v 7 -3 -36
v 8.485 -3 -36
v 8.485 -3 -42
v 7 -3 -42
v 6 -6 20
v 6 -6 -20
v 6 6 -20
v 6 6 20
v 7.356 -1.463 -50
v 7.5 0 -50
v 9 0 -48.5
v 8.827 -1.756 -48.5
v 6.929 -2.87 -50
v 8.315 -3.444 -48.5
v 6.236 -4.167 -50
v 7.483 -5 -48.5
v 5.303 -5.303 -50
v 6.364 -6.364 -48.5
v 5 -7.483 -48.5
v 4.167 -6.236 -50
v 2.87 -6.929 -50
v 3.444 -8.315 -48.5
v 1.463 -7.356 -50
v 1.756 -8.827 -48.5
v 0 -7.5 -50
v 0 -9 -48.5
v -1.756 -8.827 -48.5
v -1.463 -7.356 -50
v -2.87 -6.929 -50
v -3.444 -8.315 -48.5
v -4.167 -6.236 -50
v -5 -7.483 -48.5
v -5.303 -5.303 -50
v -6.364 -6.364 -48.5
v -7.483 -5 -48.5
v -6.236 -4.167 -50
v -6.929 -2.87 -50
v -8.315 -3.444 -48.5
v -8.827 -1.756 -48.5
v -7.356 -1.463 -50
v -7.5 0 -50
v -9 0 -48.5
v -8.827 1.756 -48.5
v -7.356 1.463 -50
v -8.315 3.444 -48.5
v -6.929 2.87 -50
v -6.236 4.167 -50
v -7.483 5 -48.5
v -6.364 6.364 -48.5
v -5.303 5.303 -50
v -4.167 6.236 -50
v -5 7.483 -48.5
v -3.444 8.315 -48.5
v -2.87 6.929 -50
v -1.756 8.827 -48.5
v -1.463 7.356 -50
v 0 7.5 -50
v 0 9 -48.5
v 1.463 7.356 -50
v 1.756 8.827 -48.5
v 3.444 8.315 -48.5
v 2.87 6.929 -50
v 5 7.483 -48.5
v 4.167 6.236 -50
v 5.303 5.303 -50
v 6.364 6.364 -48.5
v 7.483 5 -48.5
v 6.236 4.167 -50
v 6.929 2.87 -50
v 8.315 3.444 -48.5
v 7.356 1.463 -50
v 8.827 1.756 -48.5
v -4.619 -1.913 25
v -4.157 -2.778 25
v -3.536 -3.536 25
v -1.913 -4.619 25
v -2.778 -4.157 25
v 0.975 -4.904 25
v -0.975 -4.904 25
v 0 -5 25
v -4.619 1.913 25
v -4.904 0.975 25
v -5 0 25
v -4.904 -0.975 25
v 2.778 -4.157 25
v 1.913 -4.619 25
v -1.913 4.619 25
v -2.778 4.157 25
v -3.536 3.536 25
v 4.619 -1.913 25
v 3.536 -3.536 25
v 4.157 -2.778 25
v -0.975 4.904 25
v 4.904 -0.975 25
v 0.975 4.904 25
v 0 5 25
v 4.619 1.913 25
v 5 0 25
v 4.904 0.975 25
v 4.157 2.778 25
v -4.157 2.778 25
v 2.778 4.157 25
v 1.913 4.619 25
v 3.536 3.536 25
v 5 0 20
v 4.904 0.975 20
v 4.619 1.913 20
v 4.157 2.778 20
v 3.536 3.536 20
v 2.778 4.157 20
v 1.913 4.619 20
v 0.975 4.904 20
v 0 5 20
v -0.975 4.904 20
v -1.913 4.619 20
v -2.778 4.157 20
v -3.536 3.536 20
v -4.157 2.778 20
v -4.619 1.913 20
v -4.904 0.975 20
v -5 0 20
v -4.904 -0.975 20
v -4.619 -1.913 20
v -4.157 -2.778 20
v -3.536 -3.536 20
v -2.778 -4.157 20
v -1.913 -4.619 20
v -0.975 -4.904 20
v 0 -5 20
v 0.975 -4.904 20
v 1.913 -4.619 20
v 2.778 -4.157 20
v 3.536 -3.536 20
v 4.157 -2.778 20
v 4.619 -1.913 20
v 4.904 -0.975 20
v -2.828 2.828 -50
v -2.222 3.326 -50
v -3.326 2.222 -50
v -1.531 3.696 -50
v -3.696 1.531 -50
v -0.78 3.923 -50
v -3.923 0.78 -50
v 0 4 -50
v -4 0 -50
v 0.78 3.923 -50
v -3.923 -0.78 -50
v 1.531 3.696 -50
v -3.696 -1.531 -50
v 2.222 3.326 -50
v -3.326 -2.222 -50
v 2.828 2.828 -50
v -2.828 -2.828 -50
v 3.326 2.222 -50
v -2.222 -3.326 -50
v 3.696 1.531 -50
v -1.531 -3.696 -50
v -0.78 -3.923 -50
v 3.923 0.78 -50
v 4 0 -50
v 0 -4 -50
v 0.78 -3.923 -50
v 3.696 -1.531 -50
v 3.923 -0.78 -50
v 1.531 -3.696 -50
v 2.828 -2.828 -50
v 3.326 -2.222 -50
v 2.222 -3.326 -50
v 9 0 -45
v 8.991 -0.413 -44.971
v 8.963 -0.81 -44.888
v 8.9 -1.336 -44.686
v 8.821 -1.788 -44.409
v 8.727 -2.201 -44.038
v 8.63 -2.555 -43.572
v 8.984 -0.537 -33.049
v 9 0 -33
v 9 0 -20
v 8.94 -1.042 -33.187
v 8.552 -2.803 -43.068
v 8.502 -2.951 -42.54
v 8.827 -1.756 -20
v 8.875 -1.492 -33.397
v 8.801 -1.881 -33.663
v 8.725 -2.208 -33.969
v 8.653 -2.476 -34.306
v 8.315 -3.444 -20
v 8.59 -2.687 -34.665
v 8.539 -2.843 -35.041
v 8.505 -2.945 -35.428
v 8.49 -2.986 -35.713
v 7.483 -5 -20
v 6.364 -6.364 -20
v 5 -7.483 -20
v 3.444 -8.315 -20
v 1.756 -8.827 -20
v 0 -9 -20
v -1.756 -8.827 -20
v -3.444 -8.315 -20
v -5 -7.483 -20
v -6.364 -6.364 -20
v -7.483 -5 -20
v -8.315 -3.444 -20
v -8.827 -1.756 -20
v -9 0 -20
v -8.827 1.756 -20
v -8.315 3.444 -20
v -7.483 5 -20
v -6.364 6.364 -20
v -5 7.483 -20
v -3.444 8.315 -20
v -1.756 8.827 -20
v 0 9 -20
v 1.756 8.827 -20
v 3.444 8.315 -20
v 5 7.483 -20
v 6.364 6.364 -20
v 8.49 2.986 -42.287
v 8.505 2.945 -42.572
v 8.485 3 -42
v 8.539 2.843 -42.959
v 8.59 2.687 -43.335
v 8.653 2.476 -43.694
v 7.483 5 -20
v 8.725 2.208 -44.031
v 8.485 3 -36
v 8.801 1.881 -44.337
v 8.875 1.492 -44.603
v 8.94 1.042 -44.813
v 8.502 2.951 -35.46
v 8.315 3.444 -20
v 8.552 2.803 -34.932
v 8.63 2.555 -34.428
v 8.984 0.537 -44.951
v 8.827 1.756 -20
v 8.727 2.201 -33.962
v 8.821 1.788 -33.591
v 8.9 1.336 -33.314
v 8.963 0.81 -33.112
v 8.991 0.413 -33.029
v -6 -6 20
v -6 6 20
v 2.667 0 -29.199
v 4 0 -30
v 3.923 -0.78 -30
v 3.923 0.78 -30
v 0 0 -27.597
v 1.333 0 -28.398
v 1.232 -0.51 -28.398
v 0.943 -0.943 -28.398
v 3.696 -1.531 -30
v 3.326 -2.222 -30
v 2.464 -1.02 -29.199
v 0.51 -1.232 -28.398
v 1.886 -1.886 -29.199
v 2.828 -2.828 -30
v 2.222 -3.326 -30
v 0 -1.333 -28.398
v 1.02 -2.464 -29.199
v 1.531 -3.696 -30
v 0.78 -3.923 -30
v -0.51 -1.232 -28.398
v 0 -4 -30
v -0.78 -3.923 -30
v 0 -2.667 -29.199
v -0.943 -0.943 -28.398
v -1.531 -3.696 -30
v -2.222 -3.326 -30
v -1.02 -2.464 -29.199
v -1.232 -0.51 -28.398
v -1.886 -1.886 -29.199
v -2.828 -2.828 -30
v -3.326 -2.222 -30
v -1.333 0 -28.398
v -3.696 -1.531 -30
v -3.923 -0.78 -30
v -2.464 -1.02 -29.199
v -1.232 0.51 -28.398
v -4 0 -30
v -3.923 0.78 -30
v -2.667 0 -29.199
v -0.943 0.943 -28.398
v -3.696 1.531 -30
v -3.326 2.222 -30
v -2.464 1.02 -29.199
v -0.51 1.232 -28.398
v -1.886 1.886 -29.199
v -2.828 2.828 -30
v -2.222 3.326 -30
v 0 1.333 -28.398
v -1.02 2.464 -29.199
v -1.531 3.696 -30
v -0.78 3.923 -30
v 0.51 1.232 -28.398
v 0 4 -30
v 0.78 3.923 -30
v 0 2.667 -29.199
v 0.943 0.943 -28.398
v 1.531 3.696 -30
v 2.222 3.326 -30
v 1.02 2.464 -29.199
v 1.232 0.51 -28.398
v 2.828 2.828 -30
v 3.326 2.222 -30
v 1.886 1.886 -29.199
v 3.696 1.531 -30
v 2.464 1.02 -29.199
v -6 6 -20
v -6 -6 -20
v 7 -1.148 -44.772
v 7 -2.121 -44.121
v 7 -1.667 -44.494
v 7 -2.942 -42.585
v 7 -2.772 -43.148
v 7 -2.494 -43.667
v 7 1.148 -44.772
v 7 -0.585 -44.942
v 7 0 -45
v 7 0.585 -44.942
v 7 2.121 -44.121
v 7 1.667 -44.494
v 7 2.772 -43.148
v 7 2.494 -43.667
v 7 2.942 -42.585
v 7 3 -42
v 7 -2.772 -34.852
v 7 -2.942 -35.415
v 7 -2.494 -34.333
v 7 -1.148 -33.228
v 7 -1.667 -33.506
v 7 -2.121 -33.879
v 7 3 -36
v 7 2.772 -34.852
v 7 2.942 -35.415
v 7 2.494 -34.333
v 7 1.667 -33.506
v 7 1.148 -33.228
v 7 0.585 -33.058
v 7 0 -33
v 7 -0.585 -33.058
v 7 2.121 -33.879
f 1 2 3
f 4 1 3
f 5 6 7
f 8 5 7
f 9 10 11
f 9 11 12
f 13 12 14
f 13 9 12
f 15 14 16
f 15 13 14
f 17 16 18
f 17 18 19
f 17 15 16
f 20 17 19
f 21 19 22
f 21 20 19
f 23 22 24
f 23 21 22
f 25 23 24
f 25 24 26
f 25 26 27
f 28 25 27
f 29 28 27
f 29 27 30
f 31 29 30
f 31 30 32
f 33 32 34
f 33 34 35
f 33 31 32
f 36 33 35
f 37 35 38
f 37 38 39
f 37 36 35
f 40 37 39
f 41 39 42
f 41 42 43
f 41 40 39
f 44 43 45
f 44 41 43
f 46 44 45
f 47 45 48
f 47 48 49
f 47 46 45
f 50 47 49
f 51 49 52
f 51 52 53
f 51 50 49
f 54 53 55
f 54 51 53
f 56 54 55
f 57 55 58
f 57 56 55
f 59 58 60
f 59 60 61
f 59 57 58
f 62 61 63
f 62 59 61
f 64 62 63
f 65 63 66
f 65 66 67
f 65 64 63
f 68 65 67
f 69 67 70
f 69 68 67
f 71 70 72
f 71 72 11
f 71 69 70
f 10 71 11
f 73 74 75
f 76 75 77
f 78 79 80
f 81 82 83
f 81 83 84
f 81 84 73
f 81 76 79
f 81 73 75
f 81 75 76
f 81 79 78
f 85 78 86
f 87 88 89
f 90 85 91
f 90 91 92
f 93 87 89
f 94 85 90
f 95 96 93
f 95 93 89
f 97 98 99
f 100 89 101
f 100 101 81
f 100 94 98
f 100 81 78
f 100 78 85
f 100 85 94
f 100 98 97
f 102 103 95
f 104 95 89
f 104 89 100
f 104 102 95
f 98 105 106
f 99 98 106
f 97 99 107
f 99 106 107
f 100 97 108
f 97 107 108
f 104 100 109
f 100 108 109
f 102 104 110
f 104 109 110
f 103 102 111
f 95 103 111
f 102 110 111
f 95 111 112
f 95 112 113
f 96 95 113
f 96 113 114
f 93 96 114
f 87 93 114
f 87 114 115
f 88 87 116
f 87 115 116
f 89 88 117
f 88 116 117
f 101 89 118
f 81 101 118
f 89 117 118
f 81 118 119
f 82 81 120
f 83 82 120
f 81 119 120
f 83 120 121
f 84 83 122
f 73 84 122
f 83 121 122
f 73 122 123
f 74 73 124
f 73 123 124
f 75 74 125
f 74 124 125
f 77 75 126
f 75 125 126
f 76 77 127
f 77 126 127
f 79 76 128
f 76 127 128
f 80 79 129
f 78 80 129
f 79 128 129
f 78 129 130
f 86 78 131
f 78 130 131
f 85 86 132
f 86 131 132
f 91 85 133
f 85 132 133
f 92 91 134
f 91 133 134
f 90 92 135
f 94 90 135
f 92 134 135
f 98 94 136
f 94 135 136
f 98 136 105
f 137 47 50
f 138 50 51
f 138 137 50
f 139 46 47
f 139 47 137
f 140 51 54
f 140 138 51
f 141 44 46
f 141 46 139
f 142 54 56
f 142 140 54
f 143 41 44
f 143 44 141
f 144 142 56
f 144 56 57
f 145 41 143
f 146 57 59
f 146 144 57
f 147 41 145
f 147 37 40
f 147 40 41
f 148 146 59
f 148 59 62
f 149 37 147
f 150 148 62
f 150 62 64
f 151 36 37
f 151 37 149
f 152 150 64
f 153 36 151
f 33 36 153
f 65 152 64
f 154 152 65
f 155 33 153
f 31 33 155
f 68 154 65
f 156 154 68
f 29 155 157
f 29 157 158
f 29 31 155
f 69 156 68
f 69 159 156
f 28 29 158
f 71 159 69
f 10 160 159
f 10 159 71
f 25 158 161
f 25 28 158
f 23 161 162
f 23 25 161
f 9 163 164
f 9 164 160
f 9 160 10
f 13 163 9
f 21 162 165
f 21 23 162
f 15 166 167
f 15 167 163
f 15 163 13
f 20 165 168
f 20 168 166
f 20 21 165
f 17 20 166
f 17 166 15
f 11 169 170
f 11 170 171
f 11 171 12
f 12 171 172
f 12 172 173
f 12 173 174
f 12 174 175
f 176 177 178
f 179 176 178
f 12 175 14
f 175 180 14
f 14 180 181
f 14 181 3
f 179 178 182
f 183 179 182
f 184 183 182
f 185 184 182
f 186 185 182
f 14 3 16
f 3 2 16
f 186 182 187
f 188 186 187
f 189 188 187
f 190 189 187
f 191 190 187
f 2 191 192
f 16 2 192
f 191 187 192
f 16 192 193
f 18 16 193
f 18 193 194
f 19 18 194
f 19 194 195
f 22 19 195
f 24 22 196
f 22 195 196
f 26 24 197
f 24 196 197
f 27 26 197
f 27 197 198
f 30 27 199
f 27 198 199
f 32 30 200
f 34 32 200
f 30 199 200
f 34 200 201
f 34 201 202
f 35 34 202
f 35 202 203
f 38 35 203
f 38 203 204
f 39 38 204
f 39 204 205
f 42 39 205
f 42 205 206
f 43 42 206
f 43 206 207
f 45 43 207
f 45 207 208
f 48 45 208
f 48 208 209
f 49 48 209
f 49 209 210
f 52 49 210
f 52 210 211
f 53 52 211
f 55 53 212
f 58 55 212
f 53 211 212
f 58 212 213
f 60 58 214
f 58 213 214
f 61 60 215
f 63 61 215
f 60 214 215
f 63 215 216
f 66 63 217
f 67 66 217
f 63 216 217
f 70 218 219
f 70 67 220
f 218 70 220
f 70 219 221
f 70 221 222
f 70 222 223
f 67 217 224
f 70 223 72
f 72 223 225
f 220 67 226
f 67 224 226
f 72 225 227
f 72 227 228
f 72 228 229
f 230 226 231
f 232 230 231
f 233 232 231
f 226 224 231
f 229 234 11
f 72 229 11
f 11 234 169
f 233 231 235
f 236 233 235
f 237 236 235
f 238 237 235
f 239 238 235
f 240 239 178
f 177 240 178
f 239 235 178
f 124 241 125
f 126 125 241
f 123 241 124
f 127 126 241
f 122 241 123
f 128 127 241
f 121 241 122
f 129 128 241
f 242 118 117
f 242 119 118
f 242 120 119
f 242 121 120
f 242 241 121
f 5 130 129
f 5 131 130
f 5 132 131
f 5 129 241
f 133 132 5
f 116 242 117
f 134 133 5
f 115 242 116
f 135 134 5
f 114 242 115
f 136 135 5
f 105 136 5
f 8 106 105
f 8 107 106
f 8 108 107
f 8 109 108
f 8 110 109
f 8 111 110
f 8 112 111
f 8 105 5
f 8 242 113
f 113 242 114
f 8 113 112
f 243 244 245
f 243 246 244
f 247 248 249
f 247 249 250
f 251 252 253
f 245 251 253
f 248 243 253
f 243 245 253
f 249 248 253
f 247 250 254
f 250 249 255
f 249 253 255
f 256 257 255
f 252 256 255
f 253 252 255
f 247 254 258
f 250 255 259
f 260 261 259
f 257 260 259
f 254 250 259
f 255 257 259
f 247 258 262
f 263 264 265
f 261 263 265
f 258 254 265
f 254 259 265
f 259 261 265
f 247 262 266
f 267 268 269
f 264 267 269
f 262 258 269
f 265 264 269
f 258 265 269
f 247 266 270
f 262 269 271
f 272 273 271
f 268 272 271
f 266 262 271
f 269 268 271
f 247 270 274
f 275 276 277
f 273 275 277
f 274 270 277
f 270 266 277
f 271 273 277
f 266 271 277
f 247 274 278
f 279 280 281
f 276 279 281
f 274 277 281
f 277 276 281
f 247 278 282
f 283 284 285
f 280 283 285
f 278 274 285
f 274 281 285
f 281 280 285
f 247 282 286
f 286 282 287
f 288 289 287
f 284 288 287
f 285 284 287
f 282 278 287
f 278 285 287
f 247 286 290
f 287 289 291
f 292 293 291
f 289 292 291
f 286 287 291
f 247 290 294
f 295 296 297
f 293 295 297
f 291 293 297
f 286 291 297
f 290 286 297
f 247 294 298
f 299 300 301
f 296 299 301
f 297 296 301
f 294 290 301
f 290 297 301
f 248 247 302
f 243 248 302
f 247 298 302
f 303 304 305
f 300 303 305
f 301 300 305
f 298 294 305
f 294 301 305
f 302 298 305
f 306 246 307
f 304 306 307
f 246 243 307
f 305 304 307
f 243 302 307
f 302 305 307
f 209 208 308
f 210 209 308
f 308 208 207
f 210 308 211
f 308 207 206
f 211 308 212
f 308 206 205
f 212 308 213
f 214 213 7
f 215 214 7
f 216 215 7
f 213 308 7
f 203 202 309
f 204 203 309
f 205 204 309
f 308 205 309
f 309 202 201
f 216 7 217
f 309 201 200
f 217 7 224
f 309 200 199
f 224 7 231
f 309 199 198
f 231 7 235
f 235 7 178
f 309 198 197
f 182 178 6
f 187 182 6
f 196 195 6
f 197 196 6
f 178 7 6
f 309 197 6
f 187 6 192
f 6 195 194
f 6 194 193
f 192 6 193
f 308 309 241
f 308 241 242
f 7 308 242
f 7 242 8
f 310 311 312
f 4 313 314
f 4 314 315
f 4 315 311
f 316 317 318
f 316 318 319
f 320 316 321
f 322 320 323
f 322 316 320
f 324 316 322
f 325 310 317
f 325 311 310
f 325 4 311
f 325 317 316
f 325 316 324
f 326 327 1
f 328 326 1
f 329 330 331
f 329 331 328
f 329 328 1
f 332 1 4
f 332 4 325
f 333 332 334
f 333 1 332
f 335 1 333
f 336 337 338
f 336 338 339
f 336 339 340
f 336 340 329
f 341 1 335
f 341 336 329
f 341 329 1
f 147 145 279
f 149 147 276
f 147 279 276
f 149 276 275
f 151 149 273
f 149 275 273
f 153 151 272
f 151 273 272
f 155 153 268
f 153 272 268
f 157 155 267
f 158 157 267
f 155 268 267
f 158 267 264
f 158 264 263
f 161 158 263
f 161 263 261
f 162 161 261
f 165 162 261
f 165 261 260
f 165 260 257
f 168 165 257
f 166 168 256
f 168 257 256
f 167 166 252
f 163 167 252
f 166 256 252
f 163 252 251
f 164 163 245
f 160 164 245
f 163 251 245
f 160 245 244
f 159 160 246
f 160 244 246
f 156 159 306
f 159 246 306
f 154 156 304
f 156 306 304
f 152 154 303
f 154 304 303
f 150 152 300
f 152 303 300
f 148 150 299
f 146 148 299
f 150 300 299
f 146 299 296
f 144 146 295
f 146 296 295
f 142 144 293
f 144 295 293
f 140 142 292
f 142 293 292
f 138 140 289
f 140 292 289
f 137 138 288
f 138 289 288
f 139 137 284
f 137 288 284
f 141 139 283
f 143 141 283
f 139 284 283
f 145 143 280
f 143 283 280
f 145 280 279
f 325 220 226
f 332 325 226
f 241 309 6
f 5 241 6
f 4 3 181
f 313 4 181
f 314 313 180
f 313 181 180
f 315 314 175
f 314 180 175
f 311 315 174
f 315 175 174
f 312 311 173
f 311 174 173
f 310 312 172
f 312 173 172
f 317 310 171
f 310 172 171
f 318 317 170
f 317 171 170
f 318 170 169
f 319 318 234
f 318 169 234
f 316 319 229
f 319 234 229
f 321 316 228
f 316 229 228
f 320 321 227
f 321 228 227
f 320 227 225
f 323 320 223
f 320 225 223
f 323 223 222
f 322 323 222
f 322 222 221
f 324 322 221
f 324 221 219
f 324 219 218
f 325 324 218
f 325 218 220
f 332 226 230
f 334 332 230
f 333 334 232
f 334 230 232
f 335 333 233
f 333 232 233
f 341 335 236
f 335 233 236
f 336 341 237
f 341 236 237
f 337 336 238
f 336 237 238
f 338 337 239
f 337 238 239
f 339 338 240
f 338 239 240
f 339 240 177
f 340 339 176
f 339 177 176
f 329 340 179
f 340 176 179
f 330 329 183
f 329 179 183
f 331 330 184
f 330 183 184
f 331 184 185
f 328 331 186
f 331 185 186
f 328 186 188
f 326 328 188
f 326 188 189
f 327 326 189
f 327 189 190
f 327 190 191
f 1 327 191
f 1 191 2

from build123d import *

# Parameters (mm, degrees)
F0_W      = 12
F0_H      = 12
F1_DEPTH  = 20
F2_R      = 5
F3_DEPTH  = 5
F4_R      = 9
F5_DEPTH  = 30
F8_DEPTH  = 2
F10_D     = 8
F10_DEPTH = 20
F10_TIP   = 2.4034424761
F11_SIZE  = 1.5


with BuildPart() as f1:
    # F0 (on Top) → F1 (new body, symmetric)
    with BuildSketch(Plane.XY):
        Rectangle(F0_W, F0_H)
    extrude(amount=F1_DEPTH, both=True)

    # F2 (on face) → F3 (join)
    with BuildSketch(Plane.XY.offset(20)):
        Circle(F2_R)
    extrude(amount=F3_DEPTH)

    # F4 (on face) → F5 (join)
    with BuildSketch(Plane(origin=(0, 0, -20), x_dir=(1, 0, 0), z_dir=(0, 0, -1))):
        Circle(F4_R)
    extrude(amount=F5_DEPTH)

    # F7 (on offset) → F8 (cut)
    with BuildSketch(Plane.YZ.offset(9)):
        with BuildLine():
            Line((-3, -36), (-3, -42))
            ThreePointArc((-3, -42), (0, -45), (3, -42))
            Line((3, -42), (3, -36))
            ThreePointArc((3, -36), (0, -33), (-3, -36))
        make_face()
    extrude(amount=-F8_DEPTH, mode=Mode.SUBTRACT)

    # F10
    with Locations(Plane(origin=(0, 0, -50), x_dir=(1, 0, 0), z_dir=(0, 0, -1))):
        with Locations((0, 0)):
            Hole(F10_D / 2, depth=F10_DEPTH)
            with Locations((0, 0, -(F10_DEPTH + F10_TIP / 2))):  # 118° drill point
                Cone(0, F10_D / 2, F10_TIP, mode=Mode.SUBTRACT)

    # F11
    f11_edges = [f1.edges().sort_by_distance(p)[0] for p in [
        (-9, 0, -50),
    ]]
    chamfer(f11_edges, length=F11_SIZE)


solid = f1.part
